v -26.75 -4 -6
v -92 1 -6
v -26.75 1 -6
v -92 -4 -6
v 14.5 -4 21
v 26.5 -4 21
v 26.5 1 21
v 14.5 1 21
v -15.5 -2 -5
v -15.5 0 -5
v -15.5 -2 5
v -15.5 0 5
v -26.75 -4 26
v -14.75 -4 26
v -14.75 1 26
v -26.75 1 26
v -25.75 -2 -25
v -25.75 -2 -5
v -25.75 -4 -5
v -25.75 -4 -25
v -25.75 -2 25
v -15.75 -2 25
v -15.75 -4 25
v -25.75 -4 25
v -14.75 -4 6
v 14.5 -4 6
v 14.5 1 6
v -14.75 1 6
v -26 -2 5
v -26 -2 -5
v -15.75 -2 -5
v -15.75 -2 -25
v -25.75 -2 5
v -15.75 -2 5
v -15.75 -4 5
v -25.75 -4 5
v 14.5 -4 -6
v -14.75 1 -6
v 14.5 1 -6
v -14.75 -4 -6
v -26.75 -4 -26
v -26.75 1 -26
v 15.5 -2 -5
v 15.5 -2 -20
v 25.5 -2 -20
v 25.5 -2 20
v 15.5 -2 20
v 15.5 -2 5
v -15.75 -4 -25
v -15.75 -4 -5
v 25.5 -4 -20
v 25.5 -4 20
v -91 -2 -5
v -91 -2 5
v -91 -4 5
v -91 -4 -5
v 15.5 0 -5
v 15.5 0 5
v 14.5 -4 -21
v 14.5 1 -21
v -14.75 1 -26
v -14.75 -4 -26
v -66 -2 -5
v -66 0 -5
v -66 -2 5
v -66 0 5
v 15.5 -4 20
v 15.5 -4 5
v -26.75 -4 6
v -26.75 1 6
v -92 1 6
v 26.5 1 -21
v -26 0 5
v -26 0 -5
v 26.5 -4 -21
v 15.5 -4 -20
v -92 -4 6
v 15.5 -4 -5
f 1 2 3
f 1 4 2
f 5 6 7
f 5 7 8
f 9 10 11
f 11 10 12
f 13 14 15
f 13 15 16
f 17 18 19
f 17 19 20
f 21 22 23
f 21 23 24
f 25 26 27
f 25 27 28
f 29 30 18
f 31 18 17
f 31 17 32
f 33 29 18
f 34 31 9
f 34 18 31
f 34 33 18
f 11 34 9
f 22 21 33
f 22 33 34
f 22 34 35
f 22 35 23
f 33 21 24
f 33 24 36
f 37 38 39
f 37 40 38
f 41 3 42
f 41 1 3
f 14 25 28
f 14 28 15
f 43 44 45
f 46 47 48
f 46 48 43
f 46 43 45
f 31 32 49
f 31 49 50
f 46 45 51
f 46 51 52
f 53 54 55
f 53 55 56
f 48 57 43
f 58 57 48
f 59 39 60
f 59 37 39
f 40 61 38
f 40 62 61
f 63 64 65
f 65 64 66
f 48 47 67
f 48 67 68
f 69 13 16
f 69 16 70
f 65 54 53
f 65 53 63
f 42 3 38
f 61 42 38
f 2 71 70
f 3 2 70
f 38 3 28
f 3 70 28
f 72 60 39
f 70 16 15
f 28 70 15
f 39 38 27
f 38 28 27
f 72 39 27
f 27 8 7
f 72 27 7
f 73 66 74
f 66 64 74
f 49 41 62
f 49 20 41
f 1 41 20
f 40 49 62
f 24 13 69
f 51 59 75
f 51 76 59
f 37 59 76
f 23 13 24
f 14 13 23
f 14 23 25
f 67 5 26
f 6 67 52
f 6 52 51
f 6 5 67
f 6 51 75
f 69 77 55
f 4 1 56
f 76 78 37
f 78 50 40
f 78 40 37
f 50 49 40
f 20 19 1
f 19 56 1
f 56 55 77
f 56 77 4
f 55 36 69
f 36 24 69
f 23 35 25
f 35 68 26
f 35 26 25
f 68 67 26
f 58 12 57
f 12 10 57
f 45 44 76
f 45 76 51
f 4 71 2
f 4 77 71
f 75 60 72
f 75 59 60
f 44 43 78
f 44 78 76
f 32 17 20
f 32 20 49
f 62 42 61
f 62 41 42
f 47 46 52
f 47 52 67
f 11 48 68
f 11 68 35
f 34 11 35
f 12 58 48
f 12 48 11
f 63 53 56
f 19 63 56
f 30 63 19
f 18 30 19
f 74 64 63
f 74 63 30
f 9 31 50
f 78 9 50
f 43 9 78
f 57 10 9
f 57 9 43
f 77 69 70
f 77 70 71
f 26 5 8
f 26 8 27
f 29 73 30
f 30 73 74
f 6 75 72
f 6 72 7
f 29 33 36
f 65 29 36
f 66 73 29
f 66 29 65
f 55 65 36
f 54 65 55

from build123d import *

# Parameters (mm, degrees)
SKETCH_3_W           = 10
SKETCH_3_H           = 40
SKETCH_3_W_2         = 31.25
SKETCH_3_H_2         = 10
SKETCH_3_W_3         = 40.25
SKETCH_3_W_4         = 25
EXTRUDE_1_DEPTH      = 1
EXTRUDE_2_DEPTH      = 4
EXTRUDE_2_DEPTH_BACK = 1
SKETCH_5_W           = 25
SKETCH_5_H           = 10
SKETCH_5_W_2         = 10
SKETCH_5_H_2         = 40
EXTRUDE_3_DEPTH      = 2


with BuildPart() as part:
    # 草图3 → 凸台-拉伸1 (new body)
    with BuildSketch(Plane(origin=(0, 0, 0), x_dir=(1, 0, 0), z_dir=(0, 1, 0))):
        with Locations((20.5, 0)):
            Rectangle(SKETCH_3_W, SKETCH_3_H)
        with Locations((-0.125, 0)):
            Rectangle(SKETCH_3_W_2, SKETCH_3_H_2)
        Polygon((-15.75, -5), (-15.75, 5), (-15.75, 25), (-25.75, 25), (-25.75, 5), (-25.75, -5), (-25.75, -25), (-15.75, -25), align=None)
        with Locations((-45.875, 0)):
            Rectangle(SKETCH_3_W_3, SKETCH_3_H_2)
        with Locations((-78.5, 0)):
            Rectangle(SKETCH_3_W_4, SKETCH_3_H_2)
    extrude(amount=EXTRUDE_1_DEPTH)

    # 草图4 → 凸台-拉伸2 (add, two sides)
    with BuildSketch(Plane.XZ) as extrude_2_sk:
        Polygon((14.5, -21), (26.5, -21), (26.5, 21), (14.5, 21), (14.5, 6), (-14.75, 6), (-14.75, 26), (-26.75, 26), (-26.75, 6), (-92, 6), (-92, -6), (-26.75, -6), (-26.75, -26), (-14.75, -26), (-14.75, -6), (14.5, -6), align=None)
        Polygon((15.5, -20), (25.5, -20), (25.5, 20), (15.5, 20), (15.5, 5), (-15.75, 5), (-15.75, 25), (-25.75, 25), (-25.75, 5), (-91, 5), (-91, -5), (-25.75, -5), (-25.75, -25), (-15.75, -25), (-15.75, -5), (15.5, -5), align=None, mode=Mode.SUBTRACT)
    extrude(amount=EXTRUDE_2_DEPTH)
    extrude(extrude_2_sk.sketch, amount=-EXTRUDE_2_DEPTH_BACK)

    # 草图5 → 凸台-拉伸3 (add)
    with BuildSketch(Plane.XZ):
        Polygon((-25.75, 25), (-25.75, 5), (-26, 5), (-26, -5), (-25.75, -5), (-25.75, -25), (-15.75, -25), (-15.75, -5), (-15.5, -5), (-15.5, 5), (-15.75, 5), (-15.75, 25), align=None)
        with Locations((-78.5, 0)):
            Rectangle(SKETCH_5_W, SKETCH_5_H)
        with Locations((20.5, 0)):
            Rectangle(SKETCH_5_W_2, SKETCH_5_H_2)
    extrude(amount=EXTRUDE_3_DEPTH)


solid = part.part
